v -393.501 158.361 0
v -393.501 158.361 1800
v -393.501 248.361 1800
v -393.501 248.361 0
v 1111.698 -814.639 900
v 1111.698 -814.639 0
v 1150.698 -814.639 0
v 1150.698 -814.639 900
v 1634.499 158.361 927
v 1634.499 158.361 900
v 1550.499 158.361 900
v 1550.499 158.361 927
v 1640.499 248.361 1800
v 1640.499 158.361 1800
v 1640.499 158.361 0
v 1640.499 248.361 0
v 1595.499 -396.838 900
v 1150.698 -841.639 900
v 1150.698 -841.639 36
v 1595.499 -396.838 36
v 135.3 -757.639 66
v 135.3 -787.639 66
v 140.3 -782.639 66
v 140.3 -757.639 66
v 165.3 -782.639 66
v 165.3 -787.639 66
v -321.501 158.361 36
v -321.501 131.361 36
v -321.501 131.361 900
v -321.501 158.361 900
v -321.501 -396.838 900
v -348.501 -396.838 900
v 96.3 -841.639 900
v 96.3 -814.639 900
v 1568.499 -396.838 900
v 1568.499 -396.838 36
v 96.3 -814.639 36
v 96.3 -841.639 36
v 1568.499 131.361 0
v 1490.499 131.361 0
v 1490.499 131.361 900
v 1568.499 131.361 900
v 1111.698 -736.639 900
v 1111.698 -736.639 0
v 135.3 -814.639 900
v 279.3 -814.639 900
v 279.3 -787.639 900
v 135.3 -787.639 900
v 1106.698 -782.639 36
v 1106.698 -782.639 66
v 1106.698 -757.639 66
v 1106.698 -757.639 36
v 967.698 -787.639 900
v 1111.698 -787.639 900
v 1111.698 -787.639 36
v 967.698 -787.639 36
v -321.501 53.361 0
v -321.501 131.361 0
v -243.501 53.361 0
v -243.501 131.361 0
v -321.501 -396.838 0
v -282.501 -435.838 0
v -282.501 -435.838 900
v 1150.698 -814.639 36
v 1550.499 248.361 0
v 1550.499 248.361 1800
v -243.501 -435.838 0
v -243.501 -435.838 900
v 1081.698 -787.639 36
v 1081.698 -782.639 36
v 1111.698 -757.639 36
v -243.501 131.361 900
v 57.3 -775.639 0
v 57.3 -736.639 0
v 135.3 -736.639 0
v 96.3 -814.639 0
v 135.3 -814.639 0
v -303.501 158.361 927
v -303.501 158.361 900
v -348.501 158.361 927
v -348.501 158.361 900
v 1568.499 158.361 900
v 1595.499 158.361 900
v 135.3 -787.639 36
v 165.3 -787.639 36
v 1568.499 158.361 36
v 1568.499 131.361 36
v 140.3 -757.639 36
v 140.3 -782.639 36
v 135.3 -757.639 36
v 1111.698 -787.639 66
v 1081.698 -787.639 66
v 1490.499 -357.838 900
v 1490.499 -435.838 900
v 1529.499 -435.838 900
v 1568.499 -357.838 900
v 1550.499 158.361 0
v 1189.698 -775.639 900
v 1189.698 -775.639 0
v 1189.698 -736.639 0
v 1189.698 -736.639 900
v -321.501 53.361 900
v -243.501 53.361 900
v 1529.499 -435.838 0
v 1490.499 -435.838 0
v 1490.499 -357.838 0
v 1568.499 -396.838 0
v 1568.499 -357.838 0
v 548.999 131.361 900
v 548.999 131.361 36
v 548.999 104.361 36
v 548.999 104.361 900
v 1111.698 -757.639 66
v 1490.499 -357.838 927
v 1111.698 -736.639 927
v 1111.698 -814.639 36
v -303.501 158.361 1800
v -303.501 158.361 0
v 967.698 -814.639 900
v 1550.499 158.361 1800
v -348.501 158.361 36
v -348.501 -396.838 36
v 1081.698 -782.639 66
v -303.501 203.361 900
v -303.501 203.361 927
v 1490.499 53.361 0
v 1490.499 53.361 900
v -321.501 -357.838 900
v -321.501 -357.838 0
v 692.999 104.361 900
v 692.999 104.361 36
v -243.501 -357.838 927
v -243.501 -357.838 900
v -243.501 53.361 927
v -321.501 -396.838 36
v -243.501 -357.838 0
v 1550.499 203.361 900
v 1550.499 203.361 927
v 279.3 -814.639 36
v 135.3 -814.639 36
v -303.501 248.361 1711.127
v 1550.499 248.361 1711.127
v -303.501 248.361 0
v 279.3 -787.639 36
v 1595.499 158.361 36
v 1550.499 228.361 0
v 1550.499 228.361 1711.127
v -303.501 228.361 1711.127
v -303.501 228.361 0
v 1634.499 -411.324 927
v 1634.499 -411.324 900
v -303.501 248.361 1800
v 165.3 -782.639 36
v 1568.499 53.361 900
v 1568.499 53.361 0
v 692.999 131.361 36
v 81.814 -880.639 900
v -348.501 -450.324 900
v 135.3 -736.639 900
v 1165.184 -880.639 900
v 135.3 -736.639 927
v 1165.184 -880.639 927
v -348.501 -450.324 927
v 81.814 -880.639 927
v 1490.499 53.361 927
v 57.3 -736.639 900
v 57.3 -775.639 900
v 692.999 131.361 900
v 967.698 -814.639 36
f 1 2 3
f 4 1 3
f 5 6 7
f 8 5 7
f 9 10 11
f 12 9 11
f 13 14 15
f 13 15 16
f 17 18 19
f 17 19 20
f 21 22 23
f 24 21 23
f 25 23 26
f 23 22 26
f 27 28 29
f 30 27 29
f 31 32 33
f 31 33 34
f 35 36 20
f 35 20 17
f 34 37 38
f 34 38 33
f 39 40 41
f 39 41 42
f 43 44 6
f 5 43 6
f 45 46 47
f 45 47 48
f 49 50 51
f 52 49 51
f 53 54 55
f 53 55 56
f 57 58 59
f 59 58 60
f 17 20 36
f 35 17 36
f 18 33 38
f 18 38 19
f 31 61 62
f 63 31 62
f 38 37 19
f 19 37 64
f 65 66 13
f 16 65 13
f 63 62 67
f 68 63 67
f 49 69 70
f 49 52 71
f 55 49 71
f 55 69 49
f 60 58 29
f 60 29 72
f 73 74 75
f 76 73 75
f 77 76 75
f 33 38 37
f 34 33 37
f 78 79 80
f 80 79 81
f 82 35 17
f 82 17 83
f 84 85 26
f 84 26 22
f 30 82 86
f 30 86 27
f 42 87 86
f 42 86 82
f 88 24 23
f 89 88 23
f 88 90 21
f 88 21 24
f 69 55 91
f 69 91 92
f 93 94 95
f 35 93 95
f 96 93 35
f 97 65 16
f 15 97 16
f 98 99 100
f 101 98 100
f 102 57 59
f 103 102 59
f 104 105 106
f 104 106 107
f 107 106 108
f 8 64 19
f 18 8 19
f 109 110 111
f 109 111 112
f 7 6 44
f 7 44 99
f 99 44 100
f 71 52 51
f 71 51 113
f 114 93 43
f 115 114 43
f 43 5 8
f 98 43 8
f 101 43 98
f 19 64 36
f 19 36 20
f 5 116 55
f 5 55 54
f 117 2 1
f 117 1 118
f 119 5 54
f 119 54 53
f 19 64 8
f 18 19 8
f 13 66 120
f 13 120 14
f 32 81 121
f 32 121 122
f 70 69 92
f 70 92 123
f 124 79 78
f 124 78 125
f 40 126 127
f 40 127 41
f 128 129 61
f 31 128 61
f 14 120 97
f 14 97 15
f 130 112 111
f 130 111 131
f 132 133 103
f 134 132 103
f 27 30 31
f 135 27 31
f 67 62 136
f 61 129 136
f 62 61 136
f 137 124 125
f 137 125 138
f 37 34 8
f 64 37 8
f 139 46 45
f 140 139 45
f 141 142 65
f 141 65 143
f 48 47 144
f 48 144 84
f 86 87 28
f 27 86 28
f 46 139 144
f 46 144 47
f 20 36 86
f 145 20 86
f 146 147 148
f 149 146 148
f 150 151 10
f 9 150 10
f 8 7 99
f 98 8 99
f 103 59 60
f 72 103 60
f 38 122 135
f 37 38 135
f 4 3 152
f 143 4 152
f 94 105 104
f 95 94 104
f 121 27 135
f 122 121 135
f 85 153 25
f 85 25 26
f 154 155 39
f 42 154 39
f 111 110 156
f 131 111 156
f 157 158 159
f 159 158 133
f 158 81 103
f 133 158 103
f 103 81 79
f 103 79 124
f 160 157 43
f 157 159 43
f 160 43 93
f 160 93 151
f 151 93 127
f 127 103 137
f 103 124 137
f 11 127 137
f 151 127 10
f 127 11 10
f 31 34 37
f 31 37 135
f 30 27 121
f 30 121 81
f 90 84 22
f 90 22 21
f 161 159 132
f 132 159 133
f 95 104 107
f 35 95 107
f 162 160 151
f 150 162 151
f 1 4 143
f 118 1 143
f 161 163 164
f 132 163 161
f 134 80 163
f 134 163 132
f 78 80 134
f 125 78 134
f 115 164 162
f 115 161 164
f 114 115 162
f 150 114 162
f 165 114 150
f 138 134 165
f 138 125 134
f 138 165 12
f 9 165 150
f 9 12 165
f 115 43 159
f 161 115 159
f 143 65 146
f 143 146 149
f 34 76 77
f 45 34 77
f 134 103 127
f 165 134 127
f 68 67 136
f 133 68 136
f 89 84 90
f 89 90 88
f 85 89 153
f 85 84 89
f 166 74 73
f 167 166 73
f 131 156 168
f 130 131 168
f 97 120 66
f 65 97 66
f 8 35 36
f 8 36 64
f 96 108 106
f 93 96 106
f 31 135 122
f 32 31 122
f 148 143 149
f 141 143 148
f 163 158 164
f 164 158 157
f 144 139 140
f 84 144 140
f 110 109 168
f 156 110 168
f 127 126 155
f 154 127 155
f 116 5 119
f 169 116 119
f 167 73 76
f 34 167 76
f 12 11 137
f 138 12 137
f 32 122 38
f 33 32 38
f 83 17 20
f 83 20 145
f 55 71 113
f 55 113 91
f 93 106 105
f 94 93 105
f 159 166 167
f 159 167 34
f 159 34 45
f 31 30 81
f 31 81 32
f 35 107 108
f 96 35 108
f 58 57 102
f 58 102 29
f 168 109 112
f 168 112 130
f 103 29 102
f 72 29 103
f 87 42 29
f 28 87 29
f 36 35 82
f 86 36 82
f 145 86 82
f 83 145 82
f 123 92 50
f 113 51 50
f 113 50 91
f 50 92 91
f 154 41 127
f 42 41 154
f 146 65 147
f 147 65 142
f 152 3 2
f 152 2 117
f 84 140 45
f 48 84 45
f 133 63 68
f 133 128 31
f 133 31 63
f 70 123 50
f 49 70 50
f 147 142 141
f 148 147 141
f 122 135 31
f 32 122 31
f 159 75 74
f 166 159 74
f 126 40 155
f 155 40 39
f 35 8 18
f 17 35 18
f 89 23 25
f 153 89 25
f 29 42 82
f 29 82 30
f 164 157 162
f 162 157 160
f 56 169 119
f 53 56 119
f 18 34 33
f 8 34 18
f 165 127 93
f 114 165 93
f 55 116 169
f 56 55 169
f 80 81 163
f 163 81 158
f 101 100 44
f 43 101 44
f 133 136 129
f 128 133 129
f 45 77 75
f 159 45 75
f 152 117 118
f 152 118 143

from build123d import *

# Parameters (mm, degrees)
F0_W      = 78
F0_H      = 78
F1_DEPTH  = 900
F2_W      = 1890
F2_H      = 864
F3_DEPTH  = 27
F4_W      = 555.198976
F4_H      = 864
F5_DEPTH  = 27
F6_W      = 555.198976
F6_H      = 864
F7_DEPTH  = 27
F8_W      = 1054.397951
F8_H      = 864
F9_DEPTH  = 27
F11_DEPTH = 864
F13_DEPTH = 864
F14_W     = 1854
F14_H     = 45
F15_DEPTH = 27
F16_W     = 90
F16_H     = 90
F17_DEPTH = 1800
F18_W     = 1854
F18_H     = 1711.126566
F19_DEPTH = 20
F20_W     = 144
F20_H     = 864
F21_DEPTH = 27
F23_DEPTH = 30
F24_W     = 144
F24_H     = 864
F25_DEPTH = 27


with BuildPart() as f1:
    # F0 (on Top) → F1 (new body)
    with BuildSketch(Plane.XY):
        with Locations((-282.501038, 92.361054)):
            Rectangle(F0_W, F0_H)
        with Locations((1529.498962, 92.361054)):
            Rectangle(F0_W, F0_H)
        Polygon((-282.501038, -435.837922), (-243.501038, -435.837922), (-243.501038, -357.837922), (-321.501038, -357.837922), (-321.501038, -396.837922), align=None)
        Polygon((1568.498962, -396.837922), (1568.498962, -357.837922), (1490.498962, -357.837922), (1490.498962, -435.837922), (1529.498962, -435.837922), align=None)
        Polygon((135.299986, -814.638946), (135.299986, -736.638946), (57.299986, -736.638946), (57.299986, -775.638946), (96.299986, -814.638946), align=None)
        Polygon((1189.697937, -775.638946), (1189.697937, -736.638946), (1111.697937, -736.638946), (1111.697937, -814.638946), (1150.697937, -814.638946), align=None)
    extrude(amount=F1_DEPTH)


with BuildPart() as f3:
    # F2 (on face) → F3 (new body)
    with BuildSketch(Plane(origin=(0, 131.361054, 0), x_dir=(-1, 0, 0), z_dir=(0, 1, 0))):
        with Locations((-623.498962, 468)):
            Rectangle(F2_W, F2_H)
    extrude(amount=F3_DEPTH)


with BuildPart() as f5:
    # F4 (on face) → F5 (new body)
    with BuildSketch(Plane(origin=(-321.501038, 0, 0), x_dir=(0, -1, 0), z_dir=(-1, 0, 0))):
        with Locations((119.238434, 468)):
            Rectangle(F4_W, F4_H)
    extrude(amount=F5_DEPTH)


with BuildPart() as f7:
    # F6 (on face) → F7 (new body)
    with BuildSketch(Plane.YZ.offset(1568.498962)):
        with Locations((-119.238434, 468)):
            Rectangle(F6_W, F6_H)
    extrude(amount=F7_DEPTH)


with BuildPart() as f9:
    # F8 (on face) → F9 (new body)
    with BuildSketch(Plane.XZ.offset(814.638946)):
        with Locations((623.498961, 468)):
            Rectangle(F8_W, F8_H)
    extrude(amount=F9_DEPTH)


with BuildPart() as f11:
    # F10 (on face) → F11 (new body)
    with BuildSketch(Plane.XY.offset(900)):
        Polygon((1568.498962, -396.837922), (1150.697937, -814.638946), (1150.697937, -841.638946), (1595.498962, -396.837922), align=None)
    extrude(amount=-F11_DEPTH)


with BuildPart() as f13:
    # F12 (on face) → F13 (new body)
    with BuildSketch(Plane.XY.offset(900)):
        Polygon((96.299986, -814.638946), (-321.501038, -396.837922), (-348.501038, -396.837922), (96.299986, -841.638946), align=None)
    extrude(amount=-F13_DEPTH)


with BuildPart() as f15:
    # F14 (on face) → F15 (new body)
    with BuildSketch(Plane.XY.offset(900)):
        Polygon((-243.501038, 53.361054), (1490.498962, 53.361054), (1595.498962, 158.361054), (1550.498962, 158.361054), (-303.501038, 158.361054), (-348.501038, 158.361054), align=None)
        Polygon((1595.498962, 158.361054), (1490.498962, 53.361054), (1490.498962, -357.837922), (1634.498962, -411.323636), (1634.498962, 158.361054), align=None)
        Polygon((1634.498962, -411.323636), (1490.498962, -357.837922), (1111.697937, -736.638946), (1165.183652, -880.638946), align=None)
        Polygon((-243.501038, -357.837922), (-243.501038, 53.361054), (-348.501038, 158.361054), (-348.501038, -396.837922), align=None)
        with Locations((623.498962, 180.861054)):
            Rectangle(F14_W, F14_H)
        Polygon((1165.183652, -880.638946), (1111.697937, -736.638946), (135.299986, -736.638946), (81.814272, -880.638946), align=None)
        Polygon((135.299986, -736.638946), (-243.501038, -357.837922), (-348.501038, -396.837922), (-348.501038, -450.323636), (81.814272, -880.638946), align=None)
    extrude(amount=F15_DEPTH)


with BuildPart() as f17:
    # F16 (on Top) → F17 (new body)
    with BuildSketch(Plane.XY):
        with Locations((1595.498962, 203.361054)):
            Rectangle(F16_W, F16_H)
        with Locations((-348.501038, 203.361054)):
            Rectangle(F16_W, F16_H)
    extrude(amount=F17_DEPTH)


with BuildPart() as f19:
    # F18 (on face) → F19 (new body)
    with BuildSketch(Plane(origin=(0, 248.361054, 0), x_dir=(-1, 0, 0), z_dir=(0, 1, 0))):
        with Locations((-623.498962, 855.563283)):
            Rectangle(F18_W, F18_H)
    extrude(amount=-F19_DEPTH)


with BuildPart() as f21:
    # F20 (on face) → F21 (new body)
    with BuildSketch(Plane(origin=(0, -814.638946, 0), x_dir=(-1, 0, 0), z_dir=(0, 1, 0))):
        with Locations((-1039.697937, 468)):
            Rectangle(F20_W, F20_H)
        with Locations((-207.299986, 468)):
            Rectangle(F20_W, F20_H)
    extrude(amount=F21_DEPTH)


with BuildPart() as f23:
    # F22 (on face) → F23 (new body)
    with BuildSketch(Plane(origin=(0, 0, 36), x_dir=(1, 0, 0), z_dir=(0, 0, -1))):
        Polygon((165.299986, 782.638946), (165.299986, 787.638946), (135.299986, 787.638946), (135.299986, 757.638946), (140.299986, 757.638946), (140.299986, 782.638946), align=None)
        Polygon((1111.697937, 787.638946), (1081.697937, 787.638946), (1081.697937, 782.638946), (1106.697937, 782.638946), (1106.697937, 757.638946), (1111.697937, 757.638946), align=None)
    extrude(amount=-F23_DEPTH)


with BuildPart() as f25:
    # F24 (on face) → F25 (new body)
    with BuildSketch(Plane.XZ.offset(-131.361054)):
        with Locations((620.998962, 468)):
            Rectangle(F24_W, F24_H)
    extrude(amount=F25_DEPTH)


solid = Compound([f1.part, f3.part, f5.part, f7.part, f9.part, f11.part, f13.part, f15.part, f17.part, f19.part, f21.part, f23.part, f25.part])
